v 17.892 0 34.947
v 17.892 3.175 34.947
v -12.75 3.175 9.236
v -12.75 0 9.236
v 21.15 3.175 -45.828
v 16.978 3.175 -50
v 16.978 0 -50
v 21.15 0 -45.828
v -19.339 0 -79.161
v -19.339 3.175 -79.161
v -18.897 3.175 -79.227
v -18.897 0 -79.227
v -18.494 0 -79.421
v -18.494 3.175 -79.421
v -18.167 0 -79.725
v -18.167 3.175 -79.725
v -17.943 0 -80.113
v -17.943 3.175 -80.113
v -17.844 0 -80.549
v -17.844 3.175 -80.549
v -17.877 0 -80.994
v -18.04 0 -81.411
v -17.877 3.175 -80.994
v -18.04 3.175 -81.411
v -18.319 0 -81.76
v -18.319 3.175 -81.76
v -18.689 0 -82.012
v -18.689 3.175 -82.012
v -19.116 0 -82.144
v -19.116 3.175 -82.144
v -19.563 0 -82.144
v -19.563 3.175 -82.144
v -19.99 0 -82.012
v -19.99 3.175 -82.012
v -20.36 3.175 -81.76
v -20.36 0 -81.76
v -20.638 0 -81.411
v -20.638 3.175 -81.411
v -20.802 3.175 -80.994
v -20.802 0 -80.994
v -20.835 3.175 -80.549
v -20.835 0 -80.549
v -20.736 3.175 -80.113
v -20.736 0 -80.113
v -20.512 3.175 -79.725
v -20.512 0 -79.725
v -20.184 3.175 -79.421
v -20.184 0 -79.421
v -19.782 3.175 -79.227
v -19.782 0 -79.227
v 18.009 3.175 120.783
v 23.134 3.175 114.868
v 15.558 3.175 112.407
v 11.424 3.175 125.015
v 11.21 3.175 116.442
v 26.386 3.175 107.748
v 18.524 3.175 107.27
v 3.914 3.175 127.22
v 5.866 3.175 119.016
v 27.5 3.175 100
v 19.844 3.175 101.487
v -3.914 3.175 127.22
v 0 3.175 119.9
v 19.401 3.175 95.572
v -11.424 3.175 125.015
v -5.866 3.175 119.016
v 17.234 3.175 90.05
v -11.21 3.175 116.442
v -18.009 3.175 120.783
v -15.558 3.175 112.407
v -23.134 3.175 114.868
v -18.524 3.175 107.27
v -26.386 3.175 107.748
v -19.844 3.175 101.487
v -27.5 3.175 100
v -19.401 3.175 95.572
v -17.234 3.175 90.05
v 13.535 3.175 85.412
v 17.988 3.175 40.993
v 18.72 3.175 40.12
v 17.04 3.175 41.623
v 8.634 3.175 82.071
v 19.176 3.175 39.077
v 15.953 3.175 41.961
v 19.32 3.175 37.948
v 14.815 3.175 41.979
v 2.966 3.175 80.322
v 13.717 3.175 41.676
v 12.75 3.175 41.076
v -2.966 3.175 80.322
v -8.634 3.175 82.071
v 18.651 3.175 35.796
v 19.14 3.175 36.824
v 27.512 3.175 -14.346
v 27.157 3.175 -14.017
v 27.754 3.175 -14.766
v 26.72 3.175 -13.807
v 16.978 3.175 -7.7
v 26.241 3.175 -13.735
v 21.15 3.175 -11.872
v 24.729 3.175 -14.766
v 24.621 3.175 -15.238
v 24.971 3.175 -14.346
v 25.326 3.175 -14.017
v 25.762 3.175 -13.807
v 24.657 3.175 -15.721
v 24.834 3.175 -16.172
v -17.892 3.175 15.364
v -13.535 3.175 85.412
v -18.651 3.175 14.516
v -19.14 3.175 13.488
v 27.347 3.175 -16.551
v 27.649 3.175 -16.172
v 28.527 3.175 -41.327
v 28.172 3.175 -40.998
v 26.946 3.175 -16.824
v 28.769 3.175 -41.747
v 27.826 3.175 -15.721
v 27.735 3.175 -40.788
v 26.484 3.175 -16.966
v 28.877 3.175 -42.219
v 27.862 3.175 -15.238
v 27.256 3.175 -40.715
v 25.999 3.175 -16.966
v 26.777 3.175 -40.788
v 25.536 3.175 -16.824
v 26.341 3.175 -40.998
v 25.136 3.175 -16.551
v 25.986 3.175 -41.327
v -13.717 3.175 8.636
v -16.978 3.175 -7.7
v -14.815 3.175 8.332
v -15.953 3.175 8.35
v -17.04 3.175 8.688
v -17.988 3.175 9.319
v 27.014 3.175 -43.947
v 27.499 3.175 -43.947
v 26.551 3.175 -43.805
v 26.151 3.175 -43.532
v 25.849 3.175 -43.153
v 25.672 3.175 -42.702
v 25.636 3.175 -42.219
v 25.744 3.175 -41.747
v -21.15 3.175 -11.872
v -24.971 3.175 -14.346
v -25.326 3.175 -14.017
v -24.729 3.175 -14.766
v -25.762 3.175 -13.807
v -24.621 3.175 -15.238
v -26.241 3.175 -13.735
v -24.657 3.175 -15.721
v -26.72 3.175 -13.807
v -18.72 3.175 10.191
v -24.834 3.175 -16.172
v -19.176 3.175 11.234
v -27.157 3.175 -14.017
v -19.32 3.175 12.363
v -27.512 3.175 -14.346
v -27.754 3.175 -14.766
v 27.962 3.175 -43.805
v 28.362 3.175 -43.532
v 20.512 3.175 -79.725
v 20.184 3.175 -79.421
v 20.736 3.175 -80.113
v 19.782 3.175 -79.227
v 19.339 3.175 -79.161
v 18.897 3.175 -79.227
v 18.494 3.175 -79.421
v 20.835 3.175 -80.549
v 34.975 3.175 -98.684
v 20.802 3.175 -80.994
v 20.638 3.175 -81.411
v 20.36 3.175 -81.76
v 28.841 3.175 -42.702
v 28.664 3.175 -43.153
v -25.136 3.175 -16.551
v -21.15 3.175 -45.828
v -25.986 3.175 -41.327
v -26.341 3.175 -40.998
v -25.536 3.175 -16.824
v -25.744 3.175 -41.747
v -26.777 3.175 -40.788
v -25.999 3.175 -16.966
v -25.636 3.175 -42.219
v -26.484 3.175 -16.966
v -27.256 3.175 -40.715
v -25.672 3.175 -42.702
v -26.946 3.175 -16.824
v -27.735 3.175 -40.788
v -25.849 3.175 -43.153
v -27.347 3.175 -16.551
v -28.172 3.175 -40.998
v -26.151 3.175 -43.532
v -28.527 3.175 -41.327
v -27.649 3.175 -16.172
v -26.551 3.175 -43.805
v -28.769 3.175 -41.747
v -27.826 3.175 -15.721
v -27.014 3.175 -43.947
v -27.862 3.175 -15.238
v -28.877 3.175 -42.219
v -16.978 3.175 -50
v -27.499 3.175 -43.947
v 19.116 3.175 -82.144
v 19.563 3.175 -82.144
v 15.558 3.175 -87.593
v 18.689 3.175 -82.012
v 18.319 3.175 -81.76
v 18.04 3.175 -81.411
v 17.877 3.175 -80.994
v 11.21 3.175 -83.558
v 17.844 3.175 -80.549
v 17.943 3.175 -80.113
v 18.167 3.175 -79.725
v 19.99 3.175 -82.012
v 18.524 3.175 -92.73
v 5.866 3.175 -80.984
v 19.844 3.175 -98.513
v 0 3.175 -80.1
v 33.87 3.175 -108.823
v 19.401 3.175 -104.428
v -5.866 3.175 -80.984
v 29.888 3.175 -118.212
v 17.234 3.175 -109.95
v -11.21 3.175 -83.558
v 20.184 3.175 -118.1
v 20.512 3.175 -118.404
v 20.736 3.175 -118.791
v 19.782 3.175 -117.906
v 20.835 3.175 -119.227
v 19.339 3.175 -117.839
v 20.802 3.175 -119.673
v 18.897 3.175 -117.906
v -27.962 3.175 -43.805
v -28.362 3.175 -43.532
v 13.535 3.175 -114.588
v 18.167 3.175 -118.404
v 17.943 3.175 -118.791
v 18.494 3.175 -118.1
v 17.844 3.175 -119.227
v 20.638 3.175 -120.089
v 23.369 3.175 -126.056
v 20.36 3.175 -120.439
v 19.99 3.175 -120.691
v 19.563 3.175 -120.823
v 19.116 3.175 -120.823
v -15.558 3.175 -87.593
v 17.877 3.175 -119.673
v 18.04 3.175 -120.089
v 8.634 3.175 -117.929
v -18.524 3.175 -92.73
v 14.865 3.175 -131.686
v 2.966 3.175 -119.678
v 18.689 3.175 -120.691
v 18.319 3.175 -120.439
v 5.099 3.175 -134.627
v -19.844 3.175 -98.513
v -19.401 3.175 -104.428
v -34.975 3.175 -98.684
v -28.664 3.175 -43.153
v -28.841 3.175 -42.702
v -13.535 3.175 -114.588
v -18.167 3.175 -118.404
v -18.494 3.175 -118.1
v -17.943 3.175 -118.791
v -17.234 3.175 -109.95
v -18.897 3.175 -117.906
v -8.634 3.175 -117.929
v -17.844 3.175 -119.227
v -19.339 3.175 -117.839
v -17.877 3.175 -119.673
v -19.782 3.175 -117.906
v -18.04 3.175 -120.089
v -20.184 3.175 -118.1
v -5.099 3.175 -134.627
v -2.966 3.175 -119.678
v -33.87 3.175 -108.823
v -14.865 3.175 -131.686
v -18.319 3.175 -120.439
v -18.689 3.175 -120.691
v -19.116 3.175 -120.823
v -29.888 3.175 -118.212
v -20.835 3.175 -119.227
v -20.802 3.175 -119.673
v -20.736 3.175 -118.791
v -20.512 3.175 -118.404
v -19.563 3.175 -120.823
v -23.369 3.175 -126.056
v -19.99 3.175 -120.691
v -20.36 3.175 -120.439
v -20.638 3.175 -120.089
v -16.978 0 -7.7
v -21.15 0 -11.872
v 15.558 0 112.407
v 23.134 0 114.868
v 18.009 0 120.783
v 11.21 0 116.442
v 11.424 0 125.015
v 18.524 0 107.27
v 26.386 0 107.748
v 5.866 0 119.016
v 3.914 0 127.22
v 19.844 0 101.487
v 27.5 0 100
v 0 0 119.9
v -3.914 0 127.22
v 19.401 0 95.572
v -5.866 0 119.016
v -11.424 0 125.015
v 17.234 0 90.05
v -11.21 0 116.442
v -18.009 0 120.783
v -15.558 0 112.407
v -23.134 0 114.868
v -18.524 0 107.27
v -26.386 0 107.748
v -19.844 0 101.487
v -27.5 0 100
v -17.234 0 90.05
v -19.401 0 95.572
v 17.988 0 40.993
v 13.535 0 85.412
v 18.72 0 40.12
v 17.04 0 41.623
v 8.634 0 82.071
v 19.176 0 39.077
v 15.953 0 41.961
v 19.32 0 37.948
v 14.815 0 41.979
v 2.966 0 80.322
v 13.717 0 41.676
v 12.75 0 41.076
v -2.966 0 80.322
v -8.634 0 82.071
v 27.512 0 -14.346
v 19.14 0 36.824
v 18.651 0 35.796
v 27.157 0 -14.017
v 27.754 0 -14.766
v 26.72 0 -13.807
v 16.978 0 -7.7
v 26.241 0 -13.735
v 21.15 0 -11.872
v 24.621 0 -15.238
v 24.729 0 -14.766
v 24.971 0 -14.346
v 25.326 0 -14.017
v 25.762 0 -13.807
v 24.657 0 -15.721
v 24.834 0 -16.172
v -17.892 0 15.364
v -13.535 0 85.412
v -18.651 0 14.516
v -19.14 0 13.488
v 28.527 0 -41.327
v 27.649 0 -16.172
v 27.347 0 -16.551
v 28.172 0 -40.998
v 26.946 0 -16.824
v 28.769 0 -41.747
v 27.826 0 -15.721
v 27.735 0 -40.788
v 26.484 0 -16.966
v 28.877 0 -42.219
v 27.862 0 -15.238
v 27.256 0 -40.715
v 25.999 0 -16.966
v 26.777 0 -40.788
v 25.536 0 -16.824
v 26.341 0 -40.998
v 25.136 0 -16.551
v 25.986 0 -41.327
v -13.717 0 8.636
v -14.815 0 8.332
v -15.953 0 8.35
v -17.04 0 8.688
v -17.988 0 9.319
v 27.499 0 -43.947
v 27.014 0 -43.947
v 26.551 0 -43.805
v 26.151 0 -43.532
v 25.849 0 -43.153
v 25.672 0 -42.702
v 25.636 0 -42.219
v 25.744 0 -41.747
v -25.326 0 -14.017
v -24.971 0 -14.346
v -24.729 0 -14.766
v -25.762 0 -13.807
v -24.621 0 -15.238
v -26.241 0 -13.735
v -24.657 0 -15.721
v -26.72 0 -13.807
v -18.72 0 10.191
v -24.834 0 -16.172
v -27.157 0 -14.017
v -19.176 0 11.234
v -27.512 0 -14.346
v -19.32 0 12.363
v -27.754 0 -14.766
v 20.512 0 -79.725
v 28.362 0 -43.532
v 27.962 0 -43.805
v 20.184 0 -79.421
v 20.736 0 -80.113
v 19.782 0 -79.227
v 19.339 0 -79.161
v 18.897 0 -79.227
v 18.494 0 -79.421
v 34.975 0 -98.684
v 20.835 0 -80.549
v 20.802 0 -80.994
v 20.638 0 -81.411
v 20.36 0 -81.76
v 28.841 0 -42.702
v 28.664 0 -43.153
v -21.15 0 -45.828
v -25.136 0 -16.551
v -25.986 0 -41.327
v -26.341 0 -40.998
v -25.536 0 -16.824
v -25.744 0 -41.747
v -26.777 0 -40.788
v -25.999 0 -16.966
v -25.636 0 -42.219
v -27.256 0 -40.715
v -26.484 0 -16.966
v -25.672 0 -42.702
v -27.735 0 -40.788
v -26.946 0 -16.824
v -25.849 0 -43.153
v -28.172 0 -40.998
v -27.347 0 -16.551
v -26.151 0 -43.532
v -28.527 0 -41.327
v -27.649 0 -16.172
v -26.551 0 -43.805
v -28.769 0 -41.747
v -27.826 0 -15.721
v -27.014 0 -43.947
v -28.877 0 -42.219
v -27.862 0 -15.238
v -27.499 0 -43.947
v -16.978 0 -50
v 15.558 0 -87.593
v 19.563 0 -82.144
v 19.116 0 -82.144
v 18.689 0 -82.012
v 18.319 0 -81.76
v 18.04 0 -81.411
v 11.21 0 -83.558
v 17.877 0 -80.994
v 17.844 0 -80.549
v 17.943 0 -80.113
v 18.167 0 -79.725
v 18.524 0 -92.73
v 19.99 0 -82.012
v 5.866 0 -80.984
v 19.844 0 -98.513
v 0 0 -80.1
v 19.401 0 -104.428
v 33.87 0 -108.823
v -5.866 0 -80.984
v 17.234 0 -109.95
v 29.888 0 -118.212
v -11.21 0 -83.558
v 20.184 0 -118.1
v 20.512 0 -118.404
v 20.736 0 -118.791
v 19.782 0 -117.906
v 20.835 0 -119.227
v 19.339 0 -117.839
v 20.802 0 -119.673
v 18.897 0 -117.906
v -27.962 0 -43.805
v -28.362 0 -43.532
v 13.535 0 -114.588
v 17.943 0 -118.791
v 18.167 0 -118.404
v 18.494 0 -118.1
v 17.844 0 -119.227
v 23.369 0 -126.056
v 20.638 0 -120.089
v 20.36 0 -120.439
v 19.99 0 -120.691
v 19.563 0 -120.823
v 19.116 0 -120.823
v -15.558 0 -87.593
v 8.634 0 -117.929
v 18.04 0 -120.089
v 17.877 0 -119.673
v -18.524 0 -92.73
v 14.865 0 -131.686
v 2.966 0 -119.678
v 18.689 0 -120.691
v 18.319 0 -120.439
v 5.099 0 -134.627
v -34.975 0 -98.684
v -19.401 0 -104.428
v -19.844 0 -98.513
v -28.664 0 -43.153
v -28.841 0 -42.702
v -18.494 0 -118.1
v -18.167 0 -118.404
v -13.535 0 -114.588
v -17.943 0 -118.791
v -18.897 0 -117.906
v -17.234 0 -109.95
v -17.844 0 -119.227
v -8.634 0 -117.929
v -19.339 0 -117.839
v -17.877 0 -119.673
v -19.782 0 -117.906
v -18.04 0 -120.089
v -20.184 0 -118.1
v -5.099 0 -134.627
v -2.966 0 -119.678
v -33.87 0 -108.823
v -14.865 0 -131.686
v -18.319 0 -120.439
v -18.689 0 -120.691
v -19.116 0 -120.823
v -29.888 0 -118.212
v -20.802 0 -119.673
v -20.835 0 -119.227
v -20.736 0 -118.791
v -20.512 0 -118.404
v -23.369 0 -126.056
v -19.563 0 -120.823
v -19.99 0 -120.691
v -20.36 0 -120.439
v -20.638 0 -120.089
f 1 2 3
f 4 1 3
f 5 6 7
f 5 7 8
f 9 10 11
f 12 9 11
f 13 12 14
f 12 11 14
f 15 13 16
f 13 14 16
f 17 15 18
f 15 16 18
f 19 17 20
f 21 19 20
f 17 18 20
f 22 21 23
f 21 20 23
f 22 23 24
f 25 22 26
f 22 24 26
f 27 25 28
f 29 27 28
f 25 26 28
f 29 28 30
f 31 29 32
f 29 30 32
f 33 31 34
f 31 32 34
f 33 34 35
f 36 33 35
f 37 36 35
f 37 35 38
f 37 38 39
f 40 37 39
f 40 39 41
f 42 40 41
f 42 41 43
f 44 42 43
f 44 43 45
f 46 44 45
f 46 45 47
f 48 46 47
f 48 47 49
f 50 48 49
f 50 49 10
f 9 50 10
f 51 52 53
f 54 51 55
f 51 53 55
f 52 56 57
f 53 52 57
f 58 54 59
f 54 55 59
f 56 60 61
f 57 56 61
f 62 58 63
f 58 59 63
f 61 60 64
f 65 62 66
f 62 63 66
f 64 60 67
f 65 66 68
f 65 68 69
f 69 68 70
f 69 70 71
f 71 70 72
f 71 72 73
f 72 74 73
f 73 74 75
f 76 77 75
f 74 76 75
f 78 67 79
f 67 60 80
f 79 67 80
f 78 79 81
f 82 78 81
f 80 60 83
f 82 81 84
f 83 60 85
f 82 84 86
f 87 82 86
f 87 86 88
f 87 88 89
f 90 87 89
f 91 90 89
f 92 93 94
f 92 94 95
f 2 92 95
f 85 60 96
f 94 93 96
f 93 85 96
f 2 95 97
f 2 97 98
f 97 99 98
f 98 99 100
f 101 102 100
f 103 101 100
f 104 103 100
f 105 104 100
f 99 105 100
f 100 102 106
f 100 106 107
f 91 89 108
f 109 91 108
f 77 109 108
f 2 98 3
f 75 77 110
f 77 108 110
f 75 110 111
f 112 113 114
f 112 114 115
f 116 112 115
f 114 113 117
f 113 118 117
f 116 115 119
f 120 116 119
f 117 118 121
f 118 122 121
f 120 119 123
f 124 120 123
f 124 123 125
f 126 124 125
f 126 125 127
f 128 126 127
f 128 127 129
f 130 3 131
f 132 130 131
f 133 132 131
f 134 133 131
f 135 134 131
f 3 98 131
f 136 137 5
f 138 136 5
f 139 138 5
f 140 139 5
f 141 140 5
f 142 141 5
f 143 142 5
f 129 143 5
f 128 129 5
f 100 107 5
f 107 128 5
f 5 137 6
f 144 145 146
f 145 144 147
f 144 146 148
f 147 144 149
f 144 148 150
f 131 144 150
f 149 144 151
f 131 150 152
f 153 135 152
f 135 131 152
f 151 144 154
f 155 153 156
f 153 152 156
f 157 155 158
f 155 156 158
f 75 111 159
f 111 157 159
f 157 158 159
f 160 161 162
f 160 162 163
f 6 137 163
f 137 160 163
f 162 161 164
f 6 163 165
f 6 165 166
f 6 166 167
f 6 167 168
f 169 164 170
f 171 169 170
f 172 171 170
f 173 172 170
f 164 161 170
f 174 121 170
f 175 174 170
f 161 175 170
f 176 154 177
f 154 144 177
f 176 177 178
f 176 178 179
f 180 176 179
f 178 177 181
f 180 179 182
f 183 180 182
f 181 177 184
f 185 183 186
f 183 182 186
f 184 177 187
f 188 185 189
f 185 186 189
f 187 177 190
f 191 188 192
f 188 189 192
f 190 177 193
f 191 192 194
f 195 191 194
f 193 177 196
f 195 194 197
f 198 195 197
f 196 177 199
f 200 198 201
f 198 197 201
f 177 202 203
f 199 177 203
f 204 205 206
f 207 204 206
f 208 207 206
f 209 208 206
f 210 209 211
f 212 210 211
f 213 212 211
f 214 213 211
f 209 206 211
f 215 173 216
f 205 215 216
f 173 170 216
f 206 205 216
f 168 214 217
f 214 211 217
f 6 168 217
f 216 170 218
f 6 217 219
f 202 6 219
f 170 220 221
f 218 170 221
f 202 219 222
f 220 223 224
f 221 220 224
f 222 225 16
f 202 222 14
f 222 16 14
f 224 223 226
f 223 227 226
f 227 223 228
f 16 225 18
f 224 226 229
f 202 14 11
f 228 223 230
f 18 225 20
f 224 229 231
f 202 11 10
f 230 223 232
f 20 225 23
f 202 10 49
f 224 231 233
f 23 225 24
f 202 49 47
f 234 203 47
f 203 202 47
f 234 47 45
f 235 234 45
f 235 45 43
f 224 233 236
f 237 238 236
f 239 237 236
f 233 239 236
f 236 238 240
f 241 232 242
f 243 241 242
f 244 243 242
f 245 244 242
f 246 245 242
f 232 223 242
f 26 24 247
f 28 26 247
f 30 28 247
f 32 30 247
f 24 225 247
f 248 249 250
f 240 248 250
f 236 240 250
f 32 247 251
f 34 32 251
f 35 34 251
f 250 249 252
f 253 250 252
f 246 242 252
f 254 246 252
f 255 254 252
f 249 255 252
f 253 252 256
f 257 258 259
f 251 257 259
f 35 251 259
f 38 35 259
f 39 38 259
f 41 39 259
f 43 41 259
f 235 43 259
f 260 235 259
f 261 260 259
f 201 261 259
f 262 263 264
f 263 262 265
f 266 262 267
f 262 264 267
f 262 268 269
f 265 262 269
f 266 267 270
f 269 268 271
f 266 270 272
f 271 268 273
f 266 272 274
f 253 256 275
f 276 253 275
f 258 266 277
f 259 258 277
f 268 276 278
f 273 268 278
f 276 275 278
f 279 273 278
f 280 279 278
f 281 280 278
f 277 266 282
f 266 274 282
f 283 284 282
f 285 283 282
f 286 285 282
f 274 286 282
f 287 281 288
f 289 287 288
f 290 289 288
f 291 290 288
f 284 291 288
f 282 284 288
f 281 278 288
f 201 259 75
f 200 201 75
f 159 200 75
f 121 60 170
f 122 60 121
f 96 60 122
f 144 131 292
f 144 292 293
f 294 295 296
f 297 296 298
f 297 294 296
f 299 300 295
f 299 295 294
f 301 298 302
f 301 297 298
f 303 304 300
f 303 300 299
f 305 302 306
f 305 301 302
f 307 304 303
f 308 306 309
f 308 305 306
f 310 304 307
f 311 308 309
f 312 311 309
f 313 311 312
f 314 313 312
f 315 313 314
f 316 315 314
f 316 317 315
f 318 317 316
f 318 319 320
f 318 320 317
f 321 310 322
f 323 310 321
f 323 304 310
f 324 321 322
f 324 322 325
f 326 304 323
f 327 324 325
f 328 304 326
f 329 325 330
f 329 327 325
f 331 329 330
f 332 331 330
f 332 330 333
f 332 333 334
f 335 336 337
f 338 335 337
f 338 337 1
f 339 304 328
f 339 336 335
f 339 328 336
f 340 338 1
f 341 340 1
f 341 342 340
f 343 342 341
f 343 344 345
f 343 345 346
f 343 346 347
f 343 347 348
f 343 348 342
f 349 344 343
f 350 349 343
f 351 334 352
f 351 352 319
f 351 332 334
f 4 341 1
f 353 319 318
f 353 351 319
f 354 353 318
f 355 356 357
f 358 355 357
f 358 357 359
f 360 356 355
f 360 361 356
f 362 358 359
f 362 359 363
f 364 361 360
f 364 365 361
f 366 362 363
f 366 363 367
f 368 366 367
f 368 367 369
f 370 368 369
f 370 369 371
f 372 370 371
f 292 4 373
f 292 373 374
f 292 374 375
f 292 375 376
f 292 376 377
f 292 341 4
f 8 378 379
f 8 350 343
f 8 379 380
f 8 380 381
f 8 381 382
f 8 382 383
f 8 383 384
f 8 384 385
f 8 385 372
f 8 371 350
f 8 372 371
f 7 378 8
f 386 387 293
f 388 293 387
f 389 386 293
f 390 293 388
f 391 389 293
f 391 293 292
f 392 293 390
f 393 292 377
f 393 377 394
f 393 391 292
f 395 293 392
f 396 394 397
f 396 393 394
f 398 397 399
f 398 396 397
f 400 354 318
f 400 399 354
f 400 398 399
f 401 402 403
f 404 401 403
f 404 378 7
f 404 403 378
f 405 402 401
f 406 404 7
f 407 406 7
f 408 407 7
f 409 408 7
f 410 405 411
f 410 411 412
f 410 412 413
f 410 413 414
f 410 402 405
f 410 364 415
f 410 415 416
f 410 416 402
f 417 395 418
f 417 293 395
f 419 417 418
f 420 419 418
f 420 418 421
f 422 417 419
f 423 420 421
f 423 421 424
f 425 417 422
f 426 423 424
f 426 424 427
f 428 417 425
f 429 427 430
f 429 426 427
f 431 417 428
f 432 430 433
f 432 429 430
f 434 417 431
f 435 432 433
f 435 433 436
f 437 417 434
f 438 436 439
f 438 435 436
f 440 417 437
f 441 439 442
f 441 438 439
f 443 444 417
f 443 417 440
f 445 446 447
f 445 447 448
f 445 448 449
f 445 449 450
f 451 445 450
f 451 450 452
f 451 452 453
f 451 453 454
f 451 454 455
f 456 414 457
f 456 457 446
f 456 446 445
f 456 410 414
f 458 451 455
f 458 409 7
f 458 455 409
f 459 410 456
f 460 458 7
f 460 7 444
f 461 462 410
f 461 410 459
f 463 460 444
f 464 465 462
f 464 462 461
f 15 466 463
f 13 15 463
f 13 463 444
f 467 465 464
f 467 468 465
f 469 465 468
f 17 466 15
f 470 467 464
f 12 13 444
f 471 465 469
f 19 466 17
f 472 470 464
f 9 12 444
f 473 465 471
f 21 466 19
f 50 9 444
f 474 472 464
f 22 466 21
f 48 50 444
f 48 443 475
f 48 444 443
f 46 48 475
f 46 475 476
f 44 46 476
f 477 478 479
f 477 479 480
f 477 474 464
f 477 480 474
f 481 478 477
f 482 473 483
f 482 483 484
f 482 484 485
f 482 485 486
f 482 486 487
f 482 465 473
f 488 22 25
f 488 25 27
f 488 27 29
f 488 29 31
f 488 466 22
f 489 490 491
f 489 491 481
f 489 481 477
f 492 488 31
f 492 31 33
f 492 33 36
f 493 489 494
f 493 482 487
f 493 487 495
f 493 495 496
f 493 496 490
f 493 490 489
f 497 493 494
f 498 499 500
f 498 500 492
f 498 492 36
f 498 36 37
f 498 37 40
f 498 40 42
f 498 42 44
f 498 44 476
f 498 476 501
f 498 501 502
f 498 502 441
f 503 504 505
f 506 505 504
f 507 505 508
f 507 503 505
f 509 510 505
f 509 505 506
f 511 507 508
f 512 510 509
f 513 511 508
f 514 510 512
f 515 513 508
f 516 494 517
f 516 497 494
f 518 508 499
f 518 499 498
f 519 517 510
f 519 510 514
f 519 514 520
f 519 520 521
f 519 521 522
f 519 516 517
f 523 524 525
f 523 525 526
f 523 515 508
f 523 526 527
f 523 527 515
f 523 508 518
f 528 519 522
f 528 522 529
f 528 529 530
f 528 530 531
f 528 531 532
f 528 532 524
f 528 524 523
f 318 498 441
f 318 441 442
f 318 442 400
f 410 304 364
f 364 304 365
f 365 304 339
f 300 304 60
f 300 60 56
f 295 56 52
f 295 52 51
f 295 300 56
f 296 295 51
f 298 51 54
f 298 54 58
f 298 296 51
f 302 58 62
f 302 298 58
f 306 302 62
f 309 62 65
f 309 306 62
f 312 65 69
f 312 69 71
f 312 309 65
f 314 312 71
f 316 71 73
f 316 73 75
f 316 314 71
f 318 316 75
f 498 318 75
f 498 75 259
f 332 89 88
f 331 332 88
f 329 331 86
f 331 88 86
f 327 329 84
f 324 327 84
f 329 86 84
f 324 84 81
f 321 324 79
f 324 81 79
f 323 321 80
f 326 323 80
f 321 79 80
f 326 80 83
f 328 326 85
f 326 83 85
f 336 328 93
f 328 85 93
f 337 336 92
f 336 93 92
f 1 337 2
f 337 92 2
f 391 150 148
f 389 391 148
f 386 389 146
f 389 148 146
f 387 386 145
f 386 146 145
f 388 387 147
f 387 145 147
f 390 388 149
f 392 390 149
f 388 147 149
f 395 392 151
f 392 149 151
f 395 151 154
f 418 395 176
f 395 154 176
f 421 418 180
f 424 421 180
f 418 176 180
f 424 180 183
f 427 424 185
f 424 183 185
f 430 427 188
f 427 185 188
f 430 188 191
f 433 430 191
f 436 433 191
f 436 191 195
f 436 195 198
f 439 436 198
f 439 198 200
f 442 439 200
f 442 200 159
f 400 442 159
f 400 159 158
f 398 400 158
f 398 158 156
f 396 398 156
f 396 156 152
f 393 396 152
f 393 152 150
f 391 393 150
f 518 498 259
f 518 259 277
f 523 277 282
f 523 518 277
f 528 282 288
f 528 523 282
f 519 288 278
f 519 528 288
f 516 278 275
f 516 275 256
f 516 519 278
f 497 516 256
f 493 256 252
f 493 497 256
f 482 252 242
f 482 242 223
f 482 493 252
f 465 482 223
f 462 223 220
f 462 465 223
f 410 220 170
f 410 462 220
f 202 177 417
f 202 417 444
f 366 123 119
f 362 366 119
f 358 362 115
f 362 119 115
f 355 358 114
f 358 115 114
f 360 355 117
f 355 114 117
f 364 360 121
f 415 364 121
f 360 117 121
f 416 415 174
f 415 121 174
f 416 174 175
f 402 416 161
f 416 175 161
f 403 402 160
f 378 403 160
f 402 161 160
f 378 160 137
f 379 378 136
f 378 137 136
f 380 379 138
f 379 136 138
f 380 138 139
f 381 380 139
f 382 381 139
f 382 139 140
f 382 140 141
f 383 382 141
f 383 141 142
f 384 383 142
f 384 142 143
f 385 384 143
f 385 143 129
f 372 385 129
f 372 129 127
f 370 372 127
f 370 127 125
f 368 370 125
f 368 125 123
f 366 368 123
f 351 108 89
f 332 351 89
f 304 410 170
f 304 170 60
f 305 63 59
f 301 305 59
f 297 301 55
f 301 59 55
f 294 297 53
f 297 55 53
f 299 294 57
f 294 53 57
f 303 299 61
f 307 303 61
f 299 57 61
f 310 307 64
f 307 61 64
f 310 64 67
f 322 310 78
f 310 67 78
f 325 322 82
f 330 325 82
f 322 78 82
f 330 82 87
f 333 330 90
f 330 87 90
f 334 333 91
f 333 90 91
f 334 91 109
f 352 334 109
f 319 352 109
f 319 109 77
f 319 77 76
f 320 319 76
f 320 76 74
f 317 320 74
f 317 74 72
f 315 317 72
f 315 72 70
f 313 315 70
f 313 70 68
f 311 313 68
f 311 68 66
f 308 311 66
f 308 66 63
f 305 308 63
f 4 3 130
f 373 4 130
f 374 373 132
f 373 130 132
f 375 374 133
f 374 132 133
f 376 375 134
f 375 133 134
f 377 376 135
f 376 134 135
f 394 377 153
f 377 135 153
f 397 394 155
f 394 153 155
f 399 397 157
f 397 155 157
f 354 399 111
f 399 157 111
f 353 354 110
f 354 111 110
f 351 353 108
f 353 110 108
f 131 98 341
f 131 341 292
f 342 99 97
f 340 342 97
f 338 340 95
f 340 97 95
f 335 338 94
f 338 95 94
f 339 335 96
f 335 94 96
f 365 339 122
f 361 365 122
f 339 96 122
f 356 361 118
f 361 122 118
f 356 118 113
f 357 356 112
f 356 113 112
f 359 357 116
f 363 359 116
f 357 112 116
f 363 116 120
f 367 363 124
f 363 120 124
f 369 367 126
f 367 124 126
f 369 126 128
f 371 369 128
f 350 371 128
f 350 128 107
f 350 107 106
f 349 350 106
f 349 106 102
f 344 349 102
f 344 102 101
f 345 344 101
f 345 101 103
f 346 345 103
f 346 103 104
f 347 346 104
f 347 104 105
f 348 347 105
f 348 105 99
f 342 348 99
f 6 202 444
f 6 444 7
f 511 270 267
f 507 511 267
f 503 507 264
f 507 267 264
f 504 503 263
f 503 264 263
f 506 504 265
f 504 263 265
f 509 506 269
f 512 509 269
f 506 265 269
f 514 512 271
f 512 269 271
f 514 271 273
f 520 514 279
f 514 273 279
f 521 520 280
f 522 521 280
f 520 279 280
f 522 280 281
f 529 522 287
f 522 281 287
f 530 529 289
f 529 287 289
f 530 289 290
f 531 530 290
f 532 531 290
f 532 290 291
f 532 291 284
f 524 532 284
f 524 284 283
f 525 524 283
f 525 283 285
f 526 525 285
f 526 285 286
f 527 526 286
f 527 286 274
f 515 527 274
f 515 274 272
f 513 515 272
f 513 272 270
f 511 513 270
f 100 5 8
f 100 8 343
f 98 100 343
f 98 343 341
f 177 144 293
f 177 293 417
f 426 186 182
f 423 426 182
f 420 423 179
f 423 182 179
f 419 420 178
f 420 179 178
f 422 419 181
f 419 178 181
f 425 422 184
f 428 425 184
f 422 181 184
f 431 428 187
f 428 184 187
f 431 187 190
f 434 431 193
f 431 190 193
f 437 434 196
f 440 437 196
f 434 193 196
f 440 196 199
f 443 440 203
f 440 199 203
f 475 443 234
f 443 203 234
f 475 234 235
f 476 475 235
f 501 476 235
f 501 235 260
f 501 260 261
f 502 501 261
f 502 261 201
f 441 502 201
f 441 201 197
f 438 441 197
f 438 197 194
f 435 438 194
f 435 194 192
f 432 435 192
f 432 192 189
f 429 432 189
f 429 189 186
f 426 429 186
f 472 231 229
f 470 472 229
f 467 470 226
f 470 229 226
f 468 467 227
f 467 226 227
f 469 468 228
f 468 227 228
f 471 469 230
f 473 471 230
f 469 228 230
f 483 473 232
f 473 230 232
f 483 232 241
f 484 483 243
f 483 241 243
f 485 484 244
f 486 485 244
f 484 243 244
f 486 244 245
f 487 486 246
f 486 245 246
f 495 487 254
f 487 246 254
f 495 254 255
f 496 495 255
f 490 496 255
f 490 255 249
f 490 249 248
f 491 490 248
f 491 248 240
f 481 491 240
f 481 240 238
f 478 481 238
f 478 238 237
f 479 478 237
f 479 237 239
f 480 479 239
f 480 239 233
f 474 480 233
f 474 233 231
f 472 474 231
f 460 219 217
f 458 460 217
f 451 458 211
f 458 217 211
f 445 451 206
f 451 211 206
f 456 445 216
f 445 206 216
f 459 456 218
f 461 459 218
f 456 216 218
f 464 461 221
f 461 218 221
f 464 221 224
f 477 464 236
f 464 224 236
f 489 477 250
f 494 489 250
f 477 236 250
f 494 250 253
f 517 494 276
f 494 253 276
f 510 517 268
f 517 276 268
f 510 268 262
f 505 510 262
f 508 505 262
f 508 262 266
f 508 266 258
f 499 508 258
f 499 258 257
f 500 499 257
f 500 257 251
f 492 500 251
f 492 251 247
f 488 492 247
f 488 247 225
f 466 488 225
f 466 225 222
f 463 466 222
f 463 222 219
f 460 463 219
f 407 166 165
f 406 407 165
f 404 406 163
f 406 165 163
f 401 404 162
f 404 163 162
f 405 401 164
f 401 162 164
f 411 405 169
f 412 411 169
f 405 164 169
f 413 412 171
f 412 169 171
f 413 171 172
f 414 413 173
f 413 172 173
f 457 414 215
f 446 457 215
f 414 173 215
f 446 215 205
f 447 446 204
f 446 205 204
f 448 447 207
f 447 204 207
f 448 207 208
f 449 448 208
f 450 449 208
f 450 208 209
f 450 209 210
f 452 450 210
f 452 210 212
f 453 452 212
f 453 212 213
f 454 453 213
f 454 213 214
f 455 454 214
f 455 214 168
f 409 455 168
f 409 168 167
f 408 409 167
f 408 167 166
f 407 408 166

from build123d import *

# Parameters (mm, degrees)
BOSS_EXTRUDE1_DEPTH     = 3.175
SKETCH2_R               = 19.9
CUT_EXTRUDE1_DEPTH      = 140.49939292
ESQUISSE2_R             = 1.5
ENL_V_MAT_EXTRU_1_DEPTH = 140.49939292
SKETCH5_R               = 1.625
CUT_EXTRUDE3_DEPTH      = 140.49939292
CUT_EXTRUDE4_DEPTH      = 140.49939292


with BuildPart() as part:
    # Sketch1 → Boss-Extrude1 (new body)
    with BuildSketch(Plane(origin=(0, 0, 0), x_dir=(1, 0, 0), z_dir=(0, 1, 0))):
        with BuildLine():
            Line((-27.5, -100), (-34.975254116, 98.684097441))
            ThreePointArc((-34.975254116, 98.684097441), (0, 135), (34.975254116, 98.684097441))
            Line((34.975254116, 98.684097441), (27.5, -100))
            ThreePointArc((27.5, -100), (0, -127.5), (-27.5, -100))
        make_face()
    extrude(amount=BOSS_EXTRUDE1_DEPTH)

    # Sketch2 → Cut-Extrude1 (cut, through all)
    with BuildSketch(Plane(origin=(0, 3.175, 0), x_dir=(1, 0, 0), z_dir=(0, 1, 0))):
        with Locations(Location((0, -100, 0), (0, 0, 270))):
            Circle(SKETCH2_R)
        with Locations(Location((0, 100, 0), (0, 0, 270))):
            Circle(SKETCH2_R)
    extrude(amount=-CUT_EXTRUDE1_DEPTH, mode=Mode.SUBTRACT)

    # Esquisse2 → Enlèv. mat.-Extru.1 (cut, through all)
    with BuildSketch(Plane(origin=(0, 3.175, 0), x_dir=(1, 0, 0), z_dir=(0, 1, 0))):
        with Locations(Location((19.339370465, 80.660629535, 0), (0, 0, 270))):
            Circle(ESQUISSE2_R)
        with Locations(Location((19.339370465, 119.339370465, 0), (0, 0, 270))):
            Circle(ESQUISSE2_R)
        with Locations(Location((-19.339370465, 119.339370465, 0), (0, 0, 270))):
            Circle(ESQUISSE2_R)
        with Locations(Location((-19.339370465, 80.660629535, 0), (0, 0, 270))):
            Circle(ESQUISSE2_R)
    extrude(amount=-ENL_V_MAT_EXTRU_1_DEPTH, mode=Mode.SUBTRACT)

    # Sketch5 → Cut-Extrude3 (cut, through all)
    with BuildSketch(Plane(origin=(0, 3.175, 0), x_dir=(1, 0, 0), z_dir=(0, 1, 0))):
        with Locations(Location((-27.256476824, 42.340455159, 0), (0, 0, 270))):
            Circle(SKETCH5_R)
        with Locations(Location((-26.241351992, 15.359544841, 0), (0, 0, 270))):
            Circle(SKETCH5_R)
        with Locations(Location((26.241351992, 15.359544841, 0), (0, 0, 270))):
            Circle(SKETCH5_R)
        with Locations(Location((27.256476824, 42.340455159, 0), (0, 0, 270))):
            Circle(SKETCH5_R)
        Polygon((-21.15, 45.828069991), (-16.978069991, 50), (16.978069991, 50), (21.15, 45.828069991), (21.15, 11.871930009), (16.978069991, 7.7), (-16.978069991, 7.7), (-21.15, 11.871930009), align=None)
    extrude(amount=-CUT_EXTRUDE3_DEPTH, mode=Mode.SUBTRACT)

    # Sketch7 → Cut-Extrude4 (cut, through all)
    with BuildSketch(Plane(origin=(0, 3.175, 0), x_dir=(1, 0, 0), z_dir=(0, 1, 0))):
        with BuildLine():
            Line((17.892039301, -34.947326615), (-12.749738424, -9.235822228))
            ThreePointArc((-12.749738424, -9.235822228), (-18.385066635, -9.728849561), (-17.892039301, -15.364177772))
            Line((-17.892039301, -15.364177772), (12.749738424, -41.07568216))
            ThreePointArc((12.749738424, -41.07568216), (18.385066635, -40.582654826), (17.892039301, -34.947326615))
        make_face()
    extrude(amount=-CUT_EXTRUDE4_DEPTH, mode=Mode.SUBTRACT)


solid = part.part
